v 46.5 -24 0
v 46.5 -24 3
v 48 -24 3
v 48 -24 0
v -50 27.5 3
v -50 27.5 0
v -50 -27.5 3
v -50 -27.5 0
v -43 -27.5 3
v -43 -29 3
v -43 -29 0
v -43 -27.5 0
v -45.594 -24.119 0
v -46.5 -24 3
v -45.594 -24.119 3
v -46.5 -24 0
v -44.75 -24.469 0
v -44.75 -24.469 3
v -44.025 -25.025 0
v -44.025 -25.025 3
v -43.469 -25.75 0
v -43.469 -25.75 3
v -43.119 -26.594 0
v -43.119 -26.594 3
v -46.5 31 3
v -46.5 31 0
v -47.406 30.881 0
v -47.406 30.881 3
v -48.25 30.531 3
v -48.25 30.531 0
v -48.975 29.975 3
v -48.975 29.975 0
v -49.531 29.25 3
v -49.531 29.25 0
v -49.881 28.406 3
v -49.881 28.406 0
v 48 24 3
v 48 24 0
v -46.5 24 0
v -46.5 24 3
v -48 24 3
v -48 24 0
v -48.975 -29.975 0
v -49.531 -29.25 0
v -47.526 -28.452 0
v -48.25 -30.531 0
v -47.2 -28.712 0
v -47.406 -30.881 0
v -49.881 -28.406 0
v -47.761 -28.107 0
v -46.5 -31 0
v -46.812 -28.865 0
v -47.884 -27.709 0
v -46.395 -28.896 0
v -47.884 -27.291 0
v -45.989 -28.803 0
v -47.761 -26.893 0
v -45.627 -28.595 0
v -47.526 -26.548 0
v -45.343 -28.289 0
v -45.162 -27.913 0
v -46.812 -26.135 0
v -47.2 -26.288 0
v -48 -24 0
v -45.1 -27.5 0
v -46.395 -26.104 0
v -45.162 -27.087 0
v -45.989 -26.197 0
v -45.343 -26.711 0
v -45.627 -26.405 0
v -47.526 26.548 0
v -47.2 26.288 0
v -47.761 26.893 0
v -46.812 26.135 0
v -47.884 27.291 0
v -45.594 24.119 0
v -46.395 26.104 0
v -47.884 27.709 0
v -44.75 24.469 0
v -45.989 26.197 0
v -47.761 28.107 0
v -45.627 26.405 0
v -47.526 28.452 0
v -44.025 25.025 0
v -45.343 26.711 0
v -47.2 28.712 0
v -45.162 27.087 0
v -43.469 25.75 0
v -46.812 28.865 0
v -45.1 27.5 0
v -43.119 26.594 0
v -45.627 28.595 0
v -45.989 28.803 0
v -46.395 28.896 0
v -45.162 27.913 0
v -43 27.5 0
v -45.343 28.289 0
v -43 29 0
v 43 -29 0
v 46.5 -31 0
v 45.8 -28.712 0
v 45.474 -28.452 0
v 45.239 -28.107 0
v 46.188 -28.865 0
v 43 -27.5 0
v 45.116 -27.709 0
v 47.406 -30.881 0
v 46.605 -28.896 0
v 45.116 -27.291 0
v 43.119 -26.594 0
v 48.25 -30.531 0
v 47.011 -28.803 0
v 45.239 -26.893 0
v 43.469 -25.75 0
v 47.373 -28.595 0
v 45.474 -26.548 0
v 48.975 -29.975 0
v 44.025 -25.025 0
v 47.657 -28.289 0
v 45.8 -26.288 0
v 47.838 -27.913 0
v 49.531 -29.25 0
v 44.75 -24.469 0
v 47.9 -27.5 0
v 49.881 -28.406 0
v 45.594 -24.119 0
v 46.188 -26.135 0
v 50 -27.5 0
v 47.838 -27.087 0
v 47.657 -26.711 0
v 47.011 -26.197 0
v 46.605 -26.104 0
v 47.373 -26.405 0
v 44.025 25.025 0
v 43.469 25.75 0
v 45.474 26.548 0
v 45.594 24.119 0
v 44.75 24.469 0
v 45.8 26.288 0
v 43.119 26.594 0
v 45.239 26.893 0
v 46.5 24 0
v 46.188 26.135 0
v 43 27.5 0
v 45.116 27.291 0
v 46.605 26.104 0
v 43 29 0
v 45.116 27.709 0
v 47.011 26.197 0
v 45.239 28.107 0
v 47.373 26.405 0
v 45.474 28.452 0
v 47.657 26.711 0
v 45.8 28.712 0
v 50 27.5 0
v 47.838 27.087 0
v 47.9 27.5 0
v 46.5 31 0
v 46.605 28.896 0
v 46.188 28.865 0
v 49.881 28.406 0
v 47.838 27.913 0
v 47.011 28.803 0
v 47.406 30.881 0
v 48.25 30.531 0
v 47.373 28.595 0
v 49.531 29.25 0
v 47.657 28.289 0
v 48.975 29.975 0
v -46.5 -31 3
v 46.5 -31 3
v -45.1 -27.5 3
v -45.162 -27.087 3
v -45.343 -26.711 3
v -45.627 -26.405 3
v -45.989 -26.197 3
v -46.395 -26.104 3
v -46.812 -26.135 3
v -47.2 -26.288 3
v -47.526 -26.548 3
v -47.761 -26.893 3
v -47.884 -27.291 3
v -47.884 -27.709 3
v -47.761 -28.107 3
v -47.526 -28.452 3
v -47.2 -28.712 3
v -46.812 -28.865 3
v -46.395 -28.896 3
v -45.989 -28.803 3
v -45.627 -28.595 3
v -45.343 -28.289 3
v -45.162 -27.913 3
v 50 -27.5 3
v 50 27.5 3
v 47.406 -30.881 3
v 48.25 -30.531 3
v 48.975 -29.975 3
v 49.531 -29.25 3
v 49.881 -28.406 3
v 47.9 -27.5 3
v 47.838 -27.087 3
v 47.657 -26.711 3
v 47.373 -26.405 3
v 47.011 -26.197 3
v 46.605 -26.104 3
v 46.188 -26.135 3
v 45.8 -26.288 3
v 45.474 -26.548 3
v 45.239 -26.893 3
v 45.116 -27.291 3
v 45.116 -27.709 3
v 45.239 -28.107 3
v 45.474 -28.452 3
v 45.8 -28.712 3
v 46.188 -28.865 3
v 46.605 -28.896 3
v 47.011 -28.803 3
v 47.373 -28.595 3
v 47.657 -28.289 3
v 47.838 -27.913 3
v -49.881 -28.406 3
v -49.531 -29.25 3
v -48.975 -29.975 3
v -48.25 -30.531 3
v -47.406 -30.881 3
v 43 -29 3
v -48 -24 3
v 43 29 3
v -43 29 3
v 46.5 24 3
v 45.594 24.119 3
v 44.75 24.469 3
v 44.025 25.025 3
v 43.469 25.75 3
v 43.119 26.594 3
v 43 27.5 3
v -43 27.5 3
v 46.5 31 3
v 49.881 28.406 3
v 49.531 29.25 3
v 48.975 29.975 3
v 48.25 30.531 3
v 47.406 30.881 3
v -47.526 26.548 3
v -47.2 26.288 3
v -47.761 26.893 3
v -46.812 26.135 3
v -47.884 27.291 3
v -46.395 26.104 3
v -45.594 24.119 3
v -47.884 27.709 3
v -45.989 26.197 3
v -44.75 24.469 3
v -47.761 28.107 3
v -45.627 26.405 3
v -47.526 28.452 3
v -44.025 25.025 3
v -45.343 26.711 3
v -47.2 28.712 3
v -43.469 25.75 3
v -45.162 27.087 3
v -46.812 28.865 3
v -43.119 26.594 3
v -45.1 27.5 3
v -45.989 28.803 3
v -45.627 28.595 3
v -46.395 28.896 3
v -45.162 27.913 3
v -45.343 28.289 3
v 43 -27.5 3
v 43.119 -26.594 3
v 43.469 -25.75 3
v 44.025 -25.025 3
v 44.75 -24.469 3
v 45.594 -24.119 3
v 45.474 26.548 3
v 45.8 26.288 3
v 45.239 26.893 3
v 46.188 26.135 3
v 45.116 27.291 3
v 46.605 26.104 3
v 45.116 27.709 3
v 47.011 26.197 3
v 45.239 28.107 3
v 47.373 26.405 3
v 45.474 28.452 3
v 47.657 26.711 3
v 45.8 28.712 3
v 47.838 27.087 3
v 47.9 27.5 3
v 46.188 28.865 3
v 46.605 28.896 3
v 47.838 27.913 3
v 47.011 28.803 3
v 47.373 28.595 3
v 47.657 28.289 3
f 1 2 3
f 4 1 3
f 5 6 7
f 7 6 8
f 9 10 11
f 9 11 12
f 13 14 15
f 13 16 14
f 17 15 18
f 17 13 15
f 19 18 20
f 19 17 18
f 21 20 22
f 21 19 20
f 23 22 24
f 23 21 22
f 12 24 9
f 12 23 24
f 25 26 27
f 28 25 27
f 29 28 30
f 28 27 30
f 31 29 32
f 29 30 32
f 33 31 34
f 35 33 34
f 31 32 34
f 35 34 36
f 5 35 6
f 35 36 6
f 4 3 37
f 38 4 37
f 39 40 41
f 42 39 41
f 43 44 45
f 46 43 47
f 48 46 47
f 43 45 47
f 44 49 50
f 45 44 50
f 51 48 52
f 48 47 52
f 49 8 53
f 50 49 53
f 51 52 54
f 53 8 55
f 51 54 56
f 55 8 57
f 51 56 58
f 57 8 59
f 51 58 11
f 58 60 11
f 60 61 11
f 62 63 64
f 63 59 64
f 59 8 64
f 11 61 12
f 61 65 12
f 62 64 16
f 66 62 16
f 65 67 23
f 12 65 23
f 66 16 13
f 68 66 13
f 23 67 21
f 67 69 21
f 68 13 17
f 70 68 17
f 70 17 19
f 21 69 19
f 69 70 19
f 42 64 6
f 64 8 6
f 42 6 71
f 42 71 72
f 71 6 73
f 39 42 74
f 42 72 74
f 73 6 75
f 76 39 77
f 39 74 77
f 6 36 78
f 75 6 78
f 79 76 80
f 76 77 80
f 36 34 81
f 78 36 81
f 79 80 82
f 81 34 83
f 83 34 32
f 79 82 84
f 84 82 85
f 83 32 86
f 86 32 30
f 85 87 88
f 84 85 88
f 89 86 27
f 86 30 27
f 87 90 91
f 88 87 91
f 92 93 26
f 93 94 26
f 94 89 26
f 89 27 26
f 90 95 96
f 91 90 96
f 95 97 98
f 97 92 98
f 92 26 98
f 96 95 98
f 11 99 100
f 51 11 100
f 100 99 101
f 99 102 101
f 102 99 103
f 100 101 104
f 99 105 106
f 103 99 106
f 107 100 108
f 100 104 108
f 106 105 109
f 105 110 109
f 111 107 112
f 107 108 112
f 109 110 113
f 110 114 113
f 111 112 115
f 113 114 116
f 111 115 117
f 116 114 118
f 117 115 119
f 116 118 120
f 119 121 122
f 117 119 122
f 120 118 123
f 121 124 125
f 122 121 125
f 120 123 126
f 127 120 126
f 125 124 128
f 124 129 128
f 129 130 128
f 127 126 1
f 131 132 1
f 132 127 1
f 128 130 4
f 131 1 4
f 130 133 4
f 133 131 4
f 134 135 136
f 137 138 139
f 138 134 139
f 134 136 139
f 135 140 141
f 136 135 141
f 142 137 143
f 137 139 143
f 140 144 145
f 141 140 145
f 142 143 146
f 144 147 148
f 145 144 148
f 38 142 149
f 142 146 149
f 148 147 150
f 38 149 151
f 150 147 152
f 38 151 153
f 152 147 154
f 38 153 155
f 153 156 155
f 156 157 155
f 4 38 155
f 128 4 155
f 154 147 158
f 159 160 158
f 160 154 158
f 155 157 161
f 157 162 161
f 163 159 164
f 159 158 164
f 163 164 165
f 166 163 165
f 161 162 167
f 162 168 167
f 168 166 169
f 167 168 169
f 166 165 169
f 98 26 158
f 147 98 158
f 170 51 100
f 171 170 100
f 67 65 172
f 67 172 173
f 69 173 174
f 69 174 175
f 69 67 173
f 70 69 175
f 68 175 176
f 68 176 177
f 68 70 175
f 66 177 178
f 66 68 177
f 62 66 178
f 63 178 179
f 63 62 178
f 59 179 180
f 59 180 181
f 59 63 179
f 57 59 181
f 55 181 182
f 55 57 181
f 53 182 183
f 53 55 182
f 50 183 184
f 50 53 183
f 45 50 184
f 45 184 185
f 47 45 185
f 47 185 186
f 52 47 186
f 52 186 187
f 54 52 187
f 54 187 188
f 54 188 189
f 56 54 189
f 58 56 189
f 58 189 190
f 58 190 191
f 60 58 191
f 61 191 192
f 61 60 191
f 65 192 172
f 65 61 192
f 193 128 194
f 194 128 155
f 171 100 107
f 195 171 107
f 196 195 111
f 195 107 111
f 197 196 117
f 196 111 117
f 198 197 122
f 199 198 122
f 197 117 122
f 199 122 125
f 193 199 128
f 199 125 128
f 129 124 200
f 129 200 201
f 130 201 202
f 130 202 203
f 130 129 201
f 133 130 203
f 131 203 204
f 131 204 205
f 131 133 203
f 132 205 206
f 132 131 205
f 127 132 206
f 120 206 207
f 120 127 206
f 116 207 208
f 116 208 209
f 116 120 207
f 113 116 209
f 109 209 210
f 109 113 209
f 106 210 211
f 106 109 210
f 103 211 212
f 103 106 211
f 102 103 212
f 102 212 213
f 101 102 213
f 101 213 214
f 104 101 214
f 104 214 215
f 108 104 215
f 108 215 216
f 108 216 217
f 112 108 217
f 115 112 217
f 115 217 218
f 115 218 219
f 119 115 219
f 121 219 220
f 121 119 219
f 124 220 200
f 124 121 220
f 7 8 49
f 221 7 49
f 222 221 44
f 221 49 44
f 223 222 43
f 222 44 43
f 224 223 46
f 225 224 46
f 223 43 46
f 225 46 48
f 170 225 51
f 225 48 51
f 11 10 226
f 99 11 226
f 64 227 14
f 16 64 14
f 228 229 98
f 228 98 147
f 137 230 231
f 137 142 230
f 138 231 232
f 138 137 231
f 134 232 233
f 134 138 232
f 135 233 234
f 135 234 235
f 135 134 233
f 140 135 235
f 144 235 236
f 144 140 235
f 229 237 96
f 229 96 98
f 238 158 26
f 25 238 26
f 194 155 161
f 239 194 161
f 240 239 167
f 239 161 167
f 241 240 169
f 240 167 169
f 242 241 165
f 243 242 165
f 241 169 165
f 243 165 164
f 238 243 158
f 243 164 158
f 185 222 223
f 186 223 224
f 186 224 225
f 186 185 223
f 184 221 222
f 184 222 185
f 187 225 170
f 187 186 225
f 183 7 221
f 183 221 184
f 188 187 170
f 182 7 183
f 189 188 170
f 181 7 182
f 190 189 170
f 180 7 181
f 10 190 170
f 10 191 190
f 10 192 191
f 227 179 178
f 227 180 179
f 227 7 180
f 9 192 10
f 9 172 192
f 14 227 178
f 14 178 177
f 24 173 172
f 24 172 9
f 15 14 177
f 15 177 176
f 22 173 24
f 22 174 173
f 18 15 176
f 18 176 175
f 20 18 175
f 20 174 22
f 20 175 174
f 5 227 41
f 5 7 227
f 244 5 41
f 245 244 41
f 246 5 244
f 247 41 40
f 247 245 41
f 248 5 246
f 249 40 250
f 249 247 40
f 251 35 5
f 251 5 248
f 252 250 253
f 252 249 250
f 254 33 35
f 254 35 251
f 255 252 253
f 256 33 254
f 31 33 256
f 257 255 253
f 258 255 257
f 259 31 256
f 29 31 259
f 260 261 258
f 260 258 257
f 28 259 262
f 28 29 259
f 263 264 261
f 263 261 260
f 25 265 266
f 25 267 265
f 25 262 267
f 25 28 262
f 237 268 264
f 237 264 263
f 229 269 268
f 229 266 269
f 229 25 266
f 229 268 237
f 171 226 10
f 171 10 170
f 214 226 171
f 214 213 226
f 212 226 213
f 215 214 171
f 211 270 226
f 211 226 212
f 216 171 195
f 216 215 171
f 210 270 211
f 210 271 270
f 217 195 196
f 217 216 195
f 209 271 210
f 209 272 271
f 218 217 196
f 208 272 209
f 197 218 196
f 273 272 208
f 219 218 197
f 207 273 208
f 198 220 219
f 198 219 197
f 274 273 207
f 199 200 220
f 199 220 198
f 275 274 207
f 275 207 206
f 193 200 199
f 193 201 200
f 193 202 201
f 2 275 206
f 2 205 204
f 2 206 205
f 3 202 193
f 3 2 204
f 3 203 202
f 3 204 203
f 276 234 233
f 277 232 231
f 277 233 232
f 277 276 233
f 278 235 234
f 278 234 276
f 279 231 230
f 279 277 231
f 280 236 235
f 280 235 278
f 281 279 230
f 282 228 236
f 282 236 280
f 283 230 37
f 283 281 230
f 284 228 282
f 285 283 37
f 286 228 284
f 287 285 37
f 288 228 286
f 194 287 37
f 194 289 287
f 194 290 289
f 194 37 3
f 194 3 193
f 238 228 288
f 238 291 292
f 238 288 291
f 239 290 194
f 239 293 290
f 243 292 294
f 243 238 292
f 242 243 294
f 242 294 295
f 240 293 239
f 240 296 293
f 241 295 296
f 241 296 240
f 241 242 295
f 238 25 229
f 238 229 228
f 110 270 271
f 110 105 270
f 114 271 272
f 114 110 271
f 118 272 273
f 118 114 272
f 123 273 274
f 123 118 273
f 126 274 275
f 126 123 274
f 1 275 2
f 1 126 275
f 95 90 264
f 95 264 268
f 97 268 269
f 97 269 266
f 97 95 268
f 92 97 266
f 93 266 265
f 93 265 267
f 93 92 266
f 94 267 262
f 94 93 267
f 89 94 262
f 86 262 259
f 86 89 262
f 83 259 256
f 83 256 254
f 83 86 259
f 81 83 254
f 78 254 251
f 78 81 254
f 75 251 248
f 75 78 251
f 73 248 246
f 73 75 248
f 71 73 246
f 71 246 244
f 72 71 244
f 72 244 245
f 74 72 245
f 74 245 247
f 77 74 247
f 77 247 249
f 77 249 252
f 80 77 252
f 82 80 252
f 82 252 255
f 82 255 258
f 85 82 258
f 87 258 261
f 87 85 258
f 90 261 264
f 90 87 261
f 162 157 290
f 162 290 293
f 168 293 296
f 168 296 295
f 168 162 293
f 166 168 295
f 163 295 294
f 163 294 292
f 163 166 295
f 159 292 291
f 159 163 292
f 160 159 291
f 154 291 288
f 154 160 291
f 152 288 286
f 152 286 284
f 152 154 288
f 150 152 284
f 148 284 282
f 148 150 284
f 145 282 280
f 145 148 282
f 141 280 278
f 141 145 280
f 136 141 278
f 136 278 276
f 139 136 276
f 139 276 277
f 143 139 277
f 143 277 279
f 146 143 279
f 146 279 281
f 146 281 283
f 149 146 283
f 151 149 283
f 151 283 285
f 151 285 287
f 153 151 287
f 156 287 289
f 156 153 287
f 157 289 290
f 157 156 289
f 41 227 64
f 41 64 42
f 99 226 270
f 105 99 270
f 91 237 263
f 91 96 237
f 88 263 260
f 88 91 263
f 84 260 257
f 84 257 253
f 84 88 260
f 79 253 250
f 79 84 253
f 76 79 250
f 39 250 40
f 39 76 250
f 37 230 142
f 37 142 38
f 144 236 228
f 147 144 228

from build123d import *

# Parameters (mm, degrees)
SKETCH1_R           = 1.4
BOSS_EXTRUDE1_DEPTH = 3
SKETCH2_W           = 5
SKETCH2_H           = 48
SKETCH2_W_2         = 86
SKETCH2_H_2         = 5
CUT_EXTRUDE1_DEPTH  = 3
FILLET1_R           = 3.5


with BuildPart() as part:
    # Sketch1 → Boss-Extrude1 (new body)
    with BuildSketch(Plane.XY):
        with BuildLine():
            Line((-46.5, -31), (46.5, -31))
            ThreePointArc((46.5, -31), (48.974873734, -29.974873734), (50, -27.5))
            Line((50, -27.5), (50, 27.5))
            ThreePointArc((50, 27.5), (48.974873734, 29.974873734), (46.5, 31))
            Line((46.5, 31), (-46.5, 31))
            ThreePointArc((-46.5, 31), (-48.974873734, 29.974873734), (-50, 27.5))
            Line((-50, 27.5), (-50, -27.5))
            ThreePointArc((-50, -27.5), (-48.974873734, -29.974873734), (-46.5, -31))
        make_face()
        with Locations((-46.5, 27.5)):
            Circle(SKETCH1_R, mode=Mode.SUBTRACT)
        with Locations((46.5, 27.5)):
            Circle(SKETCH1_R, mode=Mode.SUBTRACT)
        with Locations((46.5, -27.5)):
            Circle(SKETCH1_R, mode=Mode.SUBTRACT)
        with Locations((-46.5, -27.5)):
            Circle(SKETCH1_R, mode=Mode.SUBTRACT)
    extrude(amount=BOSS_EXTRUDE1_DEPTH)

    # Sketch2 → Cut-Extrude1 (cut)
    with BuildSketch(Plane.XY.offset(3)):
        with Locations((-45.5, 0)):
            Rectangle(SKETCH2_W, SKETCH2_H)
        Rectangle(SKETCH2_W_2, SKETCH2_H)
        with Locations((0, 26.5)):
            Rectangle(SKETCH2_W_2, SKETCH2_H_2)
        with Locations((45.5, 0)):
            Rectangle(SKETCH2_W, SKETCH2_H)
        with Locations((0, -26.5)):
            Rectangle(SKETCH2_W_2, SKETCH2_H_2)
    extrude(amount=-CUT_EXTRUDE1_DEPTH, mode=Mode.SUBTRACT)

    # Fillet1
    fillet1_edges = [part.edges().sort_by_distance(p)[0] for p in [
        (-43, 24, 1.5),
        (43, 24, 1.5),
        (43, -24, 1.5),
        (-43, -24, 1.5),
    ]]
    fillet(fillet1_edges, radius=FILLET1_R)


solid = part.part
